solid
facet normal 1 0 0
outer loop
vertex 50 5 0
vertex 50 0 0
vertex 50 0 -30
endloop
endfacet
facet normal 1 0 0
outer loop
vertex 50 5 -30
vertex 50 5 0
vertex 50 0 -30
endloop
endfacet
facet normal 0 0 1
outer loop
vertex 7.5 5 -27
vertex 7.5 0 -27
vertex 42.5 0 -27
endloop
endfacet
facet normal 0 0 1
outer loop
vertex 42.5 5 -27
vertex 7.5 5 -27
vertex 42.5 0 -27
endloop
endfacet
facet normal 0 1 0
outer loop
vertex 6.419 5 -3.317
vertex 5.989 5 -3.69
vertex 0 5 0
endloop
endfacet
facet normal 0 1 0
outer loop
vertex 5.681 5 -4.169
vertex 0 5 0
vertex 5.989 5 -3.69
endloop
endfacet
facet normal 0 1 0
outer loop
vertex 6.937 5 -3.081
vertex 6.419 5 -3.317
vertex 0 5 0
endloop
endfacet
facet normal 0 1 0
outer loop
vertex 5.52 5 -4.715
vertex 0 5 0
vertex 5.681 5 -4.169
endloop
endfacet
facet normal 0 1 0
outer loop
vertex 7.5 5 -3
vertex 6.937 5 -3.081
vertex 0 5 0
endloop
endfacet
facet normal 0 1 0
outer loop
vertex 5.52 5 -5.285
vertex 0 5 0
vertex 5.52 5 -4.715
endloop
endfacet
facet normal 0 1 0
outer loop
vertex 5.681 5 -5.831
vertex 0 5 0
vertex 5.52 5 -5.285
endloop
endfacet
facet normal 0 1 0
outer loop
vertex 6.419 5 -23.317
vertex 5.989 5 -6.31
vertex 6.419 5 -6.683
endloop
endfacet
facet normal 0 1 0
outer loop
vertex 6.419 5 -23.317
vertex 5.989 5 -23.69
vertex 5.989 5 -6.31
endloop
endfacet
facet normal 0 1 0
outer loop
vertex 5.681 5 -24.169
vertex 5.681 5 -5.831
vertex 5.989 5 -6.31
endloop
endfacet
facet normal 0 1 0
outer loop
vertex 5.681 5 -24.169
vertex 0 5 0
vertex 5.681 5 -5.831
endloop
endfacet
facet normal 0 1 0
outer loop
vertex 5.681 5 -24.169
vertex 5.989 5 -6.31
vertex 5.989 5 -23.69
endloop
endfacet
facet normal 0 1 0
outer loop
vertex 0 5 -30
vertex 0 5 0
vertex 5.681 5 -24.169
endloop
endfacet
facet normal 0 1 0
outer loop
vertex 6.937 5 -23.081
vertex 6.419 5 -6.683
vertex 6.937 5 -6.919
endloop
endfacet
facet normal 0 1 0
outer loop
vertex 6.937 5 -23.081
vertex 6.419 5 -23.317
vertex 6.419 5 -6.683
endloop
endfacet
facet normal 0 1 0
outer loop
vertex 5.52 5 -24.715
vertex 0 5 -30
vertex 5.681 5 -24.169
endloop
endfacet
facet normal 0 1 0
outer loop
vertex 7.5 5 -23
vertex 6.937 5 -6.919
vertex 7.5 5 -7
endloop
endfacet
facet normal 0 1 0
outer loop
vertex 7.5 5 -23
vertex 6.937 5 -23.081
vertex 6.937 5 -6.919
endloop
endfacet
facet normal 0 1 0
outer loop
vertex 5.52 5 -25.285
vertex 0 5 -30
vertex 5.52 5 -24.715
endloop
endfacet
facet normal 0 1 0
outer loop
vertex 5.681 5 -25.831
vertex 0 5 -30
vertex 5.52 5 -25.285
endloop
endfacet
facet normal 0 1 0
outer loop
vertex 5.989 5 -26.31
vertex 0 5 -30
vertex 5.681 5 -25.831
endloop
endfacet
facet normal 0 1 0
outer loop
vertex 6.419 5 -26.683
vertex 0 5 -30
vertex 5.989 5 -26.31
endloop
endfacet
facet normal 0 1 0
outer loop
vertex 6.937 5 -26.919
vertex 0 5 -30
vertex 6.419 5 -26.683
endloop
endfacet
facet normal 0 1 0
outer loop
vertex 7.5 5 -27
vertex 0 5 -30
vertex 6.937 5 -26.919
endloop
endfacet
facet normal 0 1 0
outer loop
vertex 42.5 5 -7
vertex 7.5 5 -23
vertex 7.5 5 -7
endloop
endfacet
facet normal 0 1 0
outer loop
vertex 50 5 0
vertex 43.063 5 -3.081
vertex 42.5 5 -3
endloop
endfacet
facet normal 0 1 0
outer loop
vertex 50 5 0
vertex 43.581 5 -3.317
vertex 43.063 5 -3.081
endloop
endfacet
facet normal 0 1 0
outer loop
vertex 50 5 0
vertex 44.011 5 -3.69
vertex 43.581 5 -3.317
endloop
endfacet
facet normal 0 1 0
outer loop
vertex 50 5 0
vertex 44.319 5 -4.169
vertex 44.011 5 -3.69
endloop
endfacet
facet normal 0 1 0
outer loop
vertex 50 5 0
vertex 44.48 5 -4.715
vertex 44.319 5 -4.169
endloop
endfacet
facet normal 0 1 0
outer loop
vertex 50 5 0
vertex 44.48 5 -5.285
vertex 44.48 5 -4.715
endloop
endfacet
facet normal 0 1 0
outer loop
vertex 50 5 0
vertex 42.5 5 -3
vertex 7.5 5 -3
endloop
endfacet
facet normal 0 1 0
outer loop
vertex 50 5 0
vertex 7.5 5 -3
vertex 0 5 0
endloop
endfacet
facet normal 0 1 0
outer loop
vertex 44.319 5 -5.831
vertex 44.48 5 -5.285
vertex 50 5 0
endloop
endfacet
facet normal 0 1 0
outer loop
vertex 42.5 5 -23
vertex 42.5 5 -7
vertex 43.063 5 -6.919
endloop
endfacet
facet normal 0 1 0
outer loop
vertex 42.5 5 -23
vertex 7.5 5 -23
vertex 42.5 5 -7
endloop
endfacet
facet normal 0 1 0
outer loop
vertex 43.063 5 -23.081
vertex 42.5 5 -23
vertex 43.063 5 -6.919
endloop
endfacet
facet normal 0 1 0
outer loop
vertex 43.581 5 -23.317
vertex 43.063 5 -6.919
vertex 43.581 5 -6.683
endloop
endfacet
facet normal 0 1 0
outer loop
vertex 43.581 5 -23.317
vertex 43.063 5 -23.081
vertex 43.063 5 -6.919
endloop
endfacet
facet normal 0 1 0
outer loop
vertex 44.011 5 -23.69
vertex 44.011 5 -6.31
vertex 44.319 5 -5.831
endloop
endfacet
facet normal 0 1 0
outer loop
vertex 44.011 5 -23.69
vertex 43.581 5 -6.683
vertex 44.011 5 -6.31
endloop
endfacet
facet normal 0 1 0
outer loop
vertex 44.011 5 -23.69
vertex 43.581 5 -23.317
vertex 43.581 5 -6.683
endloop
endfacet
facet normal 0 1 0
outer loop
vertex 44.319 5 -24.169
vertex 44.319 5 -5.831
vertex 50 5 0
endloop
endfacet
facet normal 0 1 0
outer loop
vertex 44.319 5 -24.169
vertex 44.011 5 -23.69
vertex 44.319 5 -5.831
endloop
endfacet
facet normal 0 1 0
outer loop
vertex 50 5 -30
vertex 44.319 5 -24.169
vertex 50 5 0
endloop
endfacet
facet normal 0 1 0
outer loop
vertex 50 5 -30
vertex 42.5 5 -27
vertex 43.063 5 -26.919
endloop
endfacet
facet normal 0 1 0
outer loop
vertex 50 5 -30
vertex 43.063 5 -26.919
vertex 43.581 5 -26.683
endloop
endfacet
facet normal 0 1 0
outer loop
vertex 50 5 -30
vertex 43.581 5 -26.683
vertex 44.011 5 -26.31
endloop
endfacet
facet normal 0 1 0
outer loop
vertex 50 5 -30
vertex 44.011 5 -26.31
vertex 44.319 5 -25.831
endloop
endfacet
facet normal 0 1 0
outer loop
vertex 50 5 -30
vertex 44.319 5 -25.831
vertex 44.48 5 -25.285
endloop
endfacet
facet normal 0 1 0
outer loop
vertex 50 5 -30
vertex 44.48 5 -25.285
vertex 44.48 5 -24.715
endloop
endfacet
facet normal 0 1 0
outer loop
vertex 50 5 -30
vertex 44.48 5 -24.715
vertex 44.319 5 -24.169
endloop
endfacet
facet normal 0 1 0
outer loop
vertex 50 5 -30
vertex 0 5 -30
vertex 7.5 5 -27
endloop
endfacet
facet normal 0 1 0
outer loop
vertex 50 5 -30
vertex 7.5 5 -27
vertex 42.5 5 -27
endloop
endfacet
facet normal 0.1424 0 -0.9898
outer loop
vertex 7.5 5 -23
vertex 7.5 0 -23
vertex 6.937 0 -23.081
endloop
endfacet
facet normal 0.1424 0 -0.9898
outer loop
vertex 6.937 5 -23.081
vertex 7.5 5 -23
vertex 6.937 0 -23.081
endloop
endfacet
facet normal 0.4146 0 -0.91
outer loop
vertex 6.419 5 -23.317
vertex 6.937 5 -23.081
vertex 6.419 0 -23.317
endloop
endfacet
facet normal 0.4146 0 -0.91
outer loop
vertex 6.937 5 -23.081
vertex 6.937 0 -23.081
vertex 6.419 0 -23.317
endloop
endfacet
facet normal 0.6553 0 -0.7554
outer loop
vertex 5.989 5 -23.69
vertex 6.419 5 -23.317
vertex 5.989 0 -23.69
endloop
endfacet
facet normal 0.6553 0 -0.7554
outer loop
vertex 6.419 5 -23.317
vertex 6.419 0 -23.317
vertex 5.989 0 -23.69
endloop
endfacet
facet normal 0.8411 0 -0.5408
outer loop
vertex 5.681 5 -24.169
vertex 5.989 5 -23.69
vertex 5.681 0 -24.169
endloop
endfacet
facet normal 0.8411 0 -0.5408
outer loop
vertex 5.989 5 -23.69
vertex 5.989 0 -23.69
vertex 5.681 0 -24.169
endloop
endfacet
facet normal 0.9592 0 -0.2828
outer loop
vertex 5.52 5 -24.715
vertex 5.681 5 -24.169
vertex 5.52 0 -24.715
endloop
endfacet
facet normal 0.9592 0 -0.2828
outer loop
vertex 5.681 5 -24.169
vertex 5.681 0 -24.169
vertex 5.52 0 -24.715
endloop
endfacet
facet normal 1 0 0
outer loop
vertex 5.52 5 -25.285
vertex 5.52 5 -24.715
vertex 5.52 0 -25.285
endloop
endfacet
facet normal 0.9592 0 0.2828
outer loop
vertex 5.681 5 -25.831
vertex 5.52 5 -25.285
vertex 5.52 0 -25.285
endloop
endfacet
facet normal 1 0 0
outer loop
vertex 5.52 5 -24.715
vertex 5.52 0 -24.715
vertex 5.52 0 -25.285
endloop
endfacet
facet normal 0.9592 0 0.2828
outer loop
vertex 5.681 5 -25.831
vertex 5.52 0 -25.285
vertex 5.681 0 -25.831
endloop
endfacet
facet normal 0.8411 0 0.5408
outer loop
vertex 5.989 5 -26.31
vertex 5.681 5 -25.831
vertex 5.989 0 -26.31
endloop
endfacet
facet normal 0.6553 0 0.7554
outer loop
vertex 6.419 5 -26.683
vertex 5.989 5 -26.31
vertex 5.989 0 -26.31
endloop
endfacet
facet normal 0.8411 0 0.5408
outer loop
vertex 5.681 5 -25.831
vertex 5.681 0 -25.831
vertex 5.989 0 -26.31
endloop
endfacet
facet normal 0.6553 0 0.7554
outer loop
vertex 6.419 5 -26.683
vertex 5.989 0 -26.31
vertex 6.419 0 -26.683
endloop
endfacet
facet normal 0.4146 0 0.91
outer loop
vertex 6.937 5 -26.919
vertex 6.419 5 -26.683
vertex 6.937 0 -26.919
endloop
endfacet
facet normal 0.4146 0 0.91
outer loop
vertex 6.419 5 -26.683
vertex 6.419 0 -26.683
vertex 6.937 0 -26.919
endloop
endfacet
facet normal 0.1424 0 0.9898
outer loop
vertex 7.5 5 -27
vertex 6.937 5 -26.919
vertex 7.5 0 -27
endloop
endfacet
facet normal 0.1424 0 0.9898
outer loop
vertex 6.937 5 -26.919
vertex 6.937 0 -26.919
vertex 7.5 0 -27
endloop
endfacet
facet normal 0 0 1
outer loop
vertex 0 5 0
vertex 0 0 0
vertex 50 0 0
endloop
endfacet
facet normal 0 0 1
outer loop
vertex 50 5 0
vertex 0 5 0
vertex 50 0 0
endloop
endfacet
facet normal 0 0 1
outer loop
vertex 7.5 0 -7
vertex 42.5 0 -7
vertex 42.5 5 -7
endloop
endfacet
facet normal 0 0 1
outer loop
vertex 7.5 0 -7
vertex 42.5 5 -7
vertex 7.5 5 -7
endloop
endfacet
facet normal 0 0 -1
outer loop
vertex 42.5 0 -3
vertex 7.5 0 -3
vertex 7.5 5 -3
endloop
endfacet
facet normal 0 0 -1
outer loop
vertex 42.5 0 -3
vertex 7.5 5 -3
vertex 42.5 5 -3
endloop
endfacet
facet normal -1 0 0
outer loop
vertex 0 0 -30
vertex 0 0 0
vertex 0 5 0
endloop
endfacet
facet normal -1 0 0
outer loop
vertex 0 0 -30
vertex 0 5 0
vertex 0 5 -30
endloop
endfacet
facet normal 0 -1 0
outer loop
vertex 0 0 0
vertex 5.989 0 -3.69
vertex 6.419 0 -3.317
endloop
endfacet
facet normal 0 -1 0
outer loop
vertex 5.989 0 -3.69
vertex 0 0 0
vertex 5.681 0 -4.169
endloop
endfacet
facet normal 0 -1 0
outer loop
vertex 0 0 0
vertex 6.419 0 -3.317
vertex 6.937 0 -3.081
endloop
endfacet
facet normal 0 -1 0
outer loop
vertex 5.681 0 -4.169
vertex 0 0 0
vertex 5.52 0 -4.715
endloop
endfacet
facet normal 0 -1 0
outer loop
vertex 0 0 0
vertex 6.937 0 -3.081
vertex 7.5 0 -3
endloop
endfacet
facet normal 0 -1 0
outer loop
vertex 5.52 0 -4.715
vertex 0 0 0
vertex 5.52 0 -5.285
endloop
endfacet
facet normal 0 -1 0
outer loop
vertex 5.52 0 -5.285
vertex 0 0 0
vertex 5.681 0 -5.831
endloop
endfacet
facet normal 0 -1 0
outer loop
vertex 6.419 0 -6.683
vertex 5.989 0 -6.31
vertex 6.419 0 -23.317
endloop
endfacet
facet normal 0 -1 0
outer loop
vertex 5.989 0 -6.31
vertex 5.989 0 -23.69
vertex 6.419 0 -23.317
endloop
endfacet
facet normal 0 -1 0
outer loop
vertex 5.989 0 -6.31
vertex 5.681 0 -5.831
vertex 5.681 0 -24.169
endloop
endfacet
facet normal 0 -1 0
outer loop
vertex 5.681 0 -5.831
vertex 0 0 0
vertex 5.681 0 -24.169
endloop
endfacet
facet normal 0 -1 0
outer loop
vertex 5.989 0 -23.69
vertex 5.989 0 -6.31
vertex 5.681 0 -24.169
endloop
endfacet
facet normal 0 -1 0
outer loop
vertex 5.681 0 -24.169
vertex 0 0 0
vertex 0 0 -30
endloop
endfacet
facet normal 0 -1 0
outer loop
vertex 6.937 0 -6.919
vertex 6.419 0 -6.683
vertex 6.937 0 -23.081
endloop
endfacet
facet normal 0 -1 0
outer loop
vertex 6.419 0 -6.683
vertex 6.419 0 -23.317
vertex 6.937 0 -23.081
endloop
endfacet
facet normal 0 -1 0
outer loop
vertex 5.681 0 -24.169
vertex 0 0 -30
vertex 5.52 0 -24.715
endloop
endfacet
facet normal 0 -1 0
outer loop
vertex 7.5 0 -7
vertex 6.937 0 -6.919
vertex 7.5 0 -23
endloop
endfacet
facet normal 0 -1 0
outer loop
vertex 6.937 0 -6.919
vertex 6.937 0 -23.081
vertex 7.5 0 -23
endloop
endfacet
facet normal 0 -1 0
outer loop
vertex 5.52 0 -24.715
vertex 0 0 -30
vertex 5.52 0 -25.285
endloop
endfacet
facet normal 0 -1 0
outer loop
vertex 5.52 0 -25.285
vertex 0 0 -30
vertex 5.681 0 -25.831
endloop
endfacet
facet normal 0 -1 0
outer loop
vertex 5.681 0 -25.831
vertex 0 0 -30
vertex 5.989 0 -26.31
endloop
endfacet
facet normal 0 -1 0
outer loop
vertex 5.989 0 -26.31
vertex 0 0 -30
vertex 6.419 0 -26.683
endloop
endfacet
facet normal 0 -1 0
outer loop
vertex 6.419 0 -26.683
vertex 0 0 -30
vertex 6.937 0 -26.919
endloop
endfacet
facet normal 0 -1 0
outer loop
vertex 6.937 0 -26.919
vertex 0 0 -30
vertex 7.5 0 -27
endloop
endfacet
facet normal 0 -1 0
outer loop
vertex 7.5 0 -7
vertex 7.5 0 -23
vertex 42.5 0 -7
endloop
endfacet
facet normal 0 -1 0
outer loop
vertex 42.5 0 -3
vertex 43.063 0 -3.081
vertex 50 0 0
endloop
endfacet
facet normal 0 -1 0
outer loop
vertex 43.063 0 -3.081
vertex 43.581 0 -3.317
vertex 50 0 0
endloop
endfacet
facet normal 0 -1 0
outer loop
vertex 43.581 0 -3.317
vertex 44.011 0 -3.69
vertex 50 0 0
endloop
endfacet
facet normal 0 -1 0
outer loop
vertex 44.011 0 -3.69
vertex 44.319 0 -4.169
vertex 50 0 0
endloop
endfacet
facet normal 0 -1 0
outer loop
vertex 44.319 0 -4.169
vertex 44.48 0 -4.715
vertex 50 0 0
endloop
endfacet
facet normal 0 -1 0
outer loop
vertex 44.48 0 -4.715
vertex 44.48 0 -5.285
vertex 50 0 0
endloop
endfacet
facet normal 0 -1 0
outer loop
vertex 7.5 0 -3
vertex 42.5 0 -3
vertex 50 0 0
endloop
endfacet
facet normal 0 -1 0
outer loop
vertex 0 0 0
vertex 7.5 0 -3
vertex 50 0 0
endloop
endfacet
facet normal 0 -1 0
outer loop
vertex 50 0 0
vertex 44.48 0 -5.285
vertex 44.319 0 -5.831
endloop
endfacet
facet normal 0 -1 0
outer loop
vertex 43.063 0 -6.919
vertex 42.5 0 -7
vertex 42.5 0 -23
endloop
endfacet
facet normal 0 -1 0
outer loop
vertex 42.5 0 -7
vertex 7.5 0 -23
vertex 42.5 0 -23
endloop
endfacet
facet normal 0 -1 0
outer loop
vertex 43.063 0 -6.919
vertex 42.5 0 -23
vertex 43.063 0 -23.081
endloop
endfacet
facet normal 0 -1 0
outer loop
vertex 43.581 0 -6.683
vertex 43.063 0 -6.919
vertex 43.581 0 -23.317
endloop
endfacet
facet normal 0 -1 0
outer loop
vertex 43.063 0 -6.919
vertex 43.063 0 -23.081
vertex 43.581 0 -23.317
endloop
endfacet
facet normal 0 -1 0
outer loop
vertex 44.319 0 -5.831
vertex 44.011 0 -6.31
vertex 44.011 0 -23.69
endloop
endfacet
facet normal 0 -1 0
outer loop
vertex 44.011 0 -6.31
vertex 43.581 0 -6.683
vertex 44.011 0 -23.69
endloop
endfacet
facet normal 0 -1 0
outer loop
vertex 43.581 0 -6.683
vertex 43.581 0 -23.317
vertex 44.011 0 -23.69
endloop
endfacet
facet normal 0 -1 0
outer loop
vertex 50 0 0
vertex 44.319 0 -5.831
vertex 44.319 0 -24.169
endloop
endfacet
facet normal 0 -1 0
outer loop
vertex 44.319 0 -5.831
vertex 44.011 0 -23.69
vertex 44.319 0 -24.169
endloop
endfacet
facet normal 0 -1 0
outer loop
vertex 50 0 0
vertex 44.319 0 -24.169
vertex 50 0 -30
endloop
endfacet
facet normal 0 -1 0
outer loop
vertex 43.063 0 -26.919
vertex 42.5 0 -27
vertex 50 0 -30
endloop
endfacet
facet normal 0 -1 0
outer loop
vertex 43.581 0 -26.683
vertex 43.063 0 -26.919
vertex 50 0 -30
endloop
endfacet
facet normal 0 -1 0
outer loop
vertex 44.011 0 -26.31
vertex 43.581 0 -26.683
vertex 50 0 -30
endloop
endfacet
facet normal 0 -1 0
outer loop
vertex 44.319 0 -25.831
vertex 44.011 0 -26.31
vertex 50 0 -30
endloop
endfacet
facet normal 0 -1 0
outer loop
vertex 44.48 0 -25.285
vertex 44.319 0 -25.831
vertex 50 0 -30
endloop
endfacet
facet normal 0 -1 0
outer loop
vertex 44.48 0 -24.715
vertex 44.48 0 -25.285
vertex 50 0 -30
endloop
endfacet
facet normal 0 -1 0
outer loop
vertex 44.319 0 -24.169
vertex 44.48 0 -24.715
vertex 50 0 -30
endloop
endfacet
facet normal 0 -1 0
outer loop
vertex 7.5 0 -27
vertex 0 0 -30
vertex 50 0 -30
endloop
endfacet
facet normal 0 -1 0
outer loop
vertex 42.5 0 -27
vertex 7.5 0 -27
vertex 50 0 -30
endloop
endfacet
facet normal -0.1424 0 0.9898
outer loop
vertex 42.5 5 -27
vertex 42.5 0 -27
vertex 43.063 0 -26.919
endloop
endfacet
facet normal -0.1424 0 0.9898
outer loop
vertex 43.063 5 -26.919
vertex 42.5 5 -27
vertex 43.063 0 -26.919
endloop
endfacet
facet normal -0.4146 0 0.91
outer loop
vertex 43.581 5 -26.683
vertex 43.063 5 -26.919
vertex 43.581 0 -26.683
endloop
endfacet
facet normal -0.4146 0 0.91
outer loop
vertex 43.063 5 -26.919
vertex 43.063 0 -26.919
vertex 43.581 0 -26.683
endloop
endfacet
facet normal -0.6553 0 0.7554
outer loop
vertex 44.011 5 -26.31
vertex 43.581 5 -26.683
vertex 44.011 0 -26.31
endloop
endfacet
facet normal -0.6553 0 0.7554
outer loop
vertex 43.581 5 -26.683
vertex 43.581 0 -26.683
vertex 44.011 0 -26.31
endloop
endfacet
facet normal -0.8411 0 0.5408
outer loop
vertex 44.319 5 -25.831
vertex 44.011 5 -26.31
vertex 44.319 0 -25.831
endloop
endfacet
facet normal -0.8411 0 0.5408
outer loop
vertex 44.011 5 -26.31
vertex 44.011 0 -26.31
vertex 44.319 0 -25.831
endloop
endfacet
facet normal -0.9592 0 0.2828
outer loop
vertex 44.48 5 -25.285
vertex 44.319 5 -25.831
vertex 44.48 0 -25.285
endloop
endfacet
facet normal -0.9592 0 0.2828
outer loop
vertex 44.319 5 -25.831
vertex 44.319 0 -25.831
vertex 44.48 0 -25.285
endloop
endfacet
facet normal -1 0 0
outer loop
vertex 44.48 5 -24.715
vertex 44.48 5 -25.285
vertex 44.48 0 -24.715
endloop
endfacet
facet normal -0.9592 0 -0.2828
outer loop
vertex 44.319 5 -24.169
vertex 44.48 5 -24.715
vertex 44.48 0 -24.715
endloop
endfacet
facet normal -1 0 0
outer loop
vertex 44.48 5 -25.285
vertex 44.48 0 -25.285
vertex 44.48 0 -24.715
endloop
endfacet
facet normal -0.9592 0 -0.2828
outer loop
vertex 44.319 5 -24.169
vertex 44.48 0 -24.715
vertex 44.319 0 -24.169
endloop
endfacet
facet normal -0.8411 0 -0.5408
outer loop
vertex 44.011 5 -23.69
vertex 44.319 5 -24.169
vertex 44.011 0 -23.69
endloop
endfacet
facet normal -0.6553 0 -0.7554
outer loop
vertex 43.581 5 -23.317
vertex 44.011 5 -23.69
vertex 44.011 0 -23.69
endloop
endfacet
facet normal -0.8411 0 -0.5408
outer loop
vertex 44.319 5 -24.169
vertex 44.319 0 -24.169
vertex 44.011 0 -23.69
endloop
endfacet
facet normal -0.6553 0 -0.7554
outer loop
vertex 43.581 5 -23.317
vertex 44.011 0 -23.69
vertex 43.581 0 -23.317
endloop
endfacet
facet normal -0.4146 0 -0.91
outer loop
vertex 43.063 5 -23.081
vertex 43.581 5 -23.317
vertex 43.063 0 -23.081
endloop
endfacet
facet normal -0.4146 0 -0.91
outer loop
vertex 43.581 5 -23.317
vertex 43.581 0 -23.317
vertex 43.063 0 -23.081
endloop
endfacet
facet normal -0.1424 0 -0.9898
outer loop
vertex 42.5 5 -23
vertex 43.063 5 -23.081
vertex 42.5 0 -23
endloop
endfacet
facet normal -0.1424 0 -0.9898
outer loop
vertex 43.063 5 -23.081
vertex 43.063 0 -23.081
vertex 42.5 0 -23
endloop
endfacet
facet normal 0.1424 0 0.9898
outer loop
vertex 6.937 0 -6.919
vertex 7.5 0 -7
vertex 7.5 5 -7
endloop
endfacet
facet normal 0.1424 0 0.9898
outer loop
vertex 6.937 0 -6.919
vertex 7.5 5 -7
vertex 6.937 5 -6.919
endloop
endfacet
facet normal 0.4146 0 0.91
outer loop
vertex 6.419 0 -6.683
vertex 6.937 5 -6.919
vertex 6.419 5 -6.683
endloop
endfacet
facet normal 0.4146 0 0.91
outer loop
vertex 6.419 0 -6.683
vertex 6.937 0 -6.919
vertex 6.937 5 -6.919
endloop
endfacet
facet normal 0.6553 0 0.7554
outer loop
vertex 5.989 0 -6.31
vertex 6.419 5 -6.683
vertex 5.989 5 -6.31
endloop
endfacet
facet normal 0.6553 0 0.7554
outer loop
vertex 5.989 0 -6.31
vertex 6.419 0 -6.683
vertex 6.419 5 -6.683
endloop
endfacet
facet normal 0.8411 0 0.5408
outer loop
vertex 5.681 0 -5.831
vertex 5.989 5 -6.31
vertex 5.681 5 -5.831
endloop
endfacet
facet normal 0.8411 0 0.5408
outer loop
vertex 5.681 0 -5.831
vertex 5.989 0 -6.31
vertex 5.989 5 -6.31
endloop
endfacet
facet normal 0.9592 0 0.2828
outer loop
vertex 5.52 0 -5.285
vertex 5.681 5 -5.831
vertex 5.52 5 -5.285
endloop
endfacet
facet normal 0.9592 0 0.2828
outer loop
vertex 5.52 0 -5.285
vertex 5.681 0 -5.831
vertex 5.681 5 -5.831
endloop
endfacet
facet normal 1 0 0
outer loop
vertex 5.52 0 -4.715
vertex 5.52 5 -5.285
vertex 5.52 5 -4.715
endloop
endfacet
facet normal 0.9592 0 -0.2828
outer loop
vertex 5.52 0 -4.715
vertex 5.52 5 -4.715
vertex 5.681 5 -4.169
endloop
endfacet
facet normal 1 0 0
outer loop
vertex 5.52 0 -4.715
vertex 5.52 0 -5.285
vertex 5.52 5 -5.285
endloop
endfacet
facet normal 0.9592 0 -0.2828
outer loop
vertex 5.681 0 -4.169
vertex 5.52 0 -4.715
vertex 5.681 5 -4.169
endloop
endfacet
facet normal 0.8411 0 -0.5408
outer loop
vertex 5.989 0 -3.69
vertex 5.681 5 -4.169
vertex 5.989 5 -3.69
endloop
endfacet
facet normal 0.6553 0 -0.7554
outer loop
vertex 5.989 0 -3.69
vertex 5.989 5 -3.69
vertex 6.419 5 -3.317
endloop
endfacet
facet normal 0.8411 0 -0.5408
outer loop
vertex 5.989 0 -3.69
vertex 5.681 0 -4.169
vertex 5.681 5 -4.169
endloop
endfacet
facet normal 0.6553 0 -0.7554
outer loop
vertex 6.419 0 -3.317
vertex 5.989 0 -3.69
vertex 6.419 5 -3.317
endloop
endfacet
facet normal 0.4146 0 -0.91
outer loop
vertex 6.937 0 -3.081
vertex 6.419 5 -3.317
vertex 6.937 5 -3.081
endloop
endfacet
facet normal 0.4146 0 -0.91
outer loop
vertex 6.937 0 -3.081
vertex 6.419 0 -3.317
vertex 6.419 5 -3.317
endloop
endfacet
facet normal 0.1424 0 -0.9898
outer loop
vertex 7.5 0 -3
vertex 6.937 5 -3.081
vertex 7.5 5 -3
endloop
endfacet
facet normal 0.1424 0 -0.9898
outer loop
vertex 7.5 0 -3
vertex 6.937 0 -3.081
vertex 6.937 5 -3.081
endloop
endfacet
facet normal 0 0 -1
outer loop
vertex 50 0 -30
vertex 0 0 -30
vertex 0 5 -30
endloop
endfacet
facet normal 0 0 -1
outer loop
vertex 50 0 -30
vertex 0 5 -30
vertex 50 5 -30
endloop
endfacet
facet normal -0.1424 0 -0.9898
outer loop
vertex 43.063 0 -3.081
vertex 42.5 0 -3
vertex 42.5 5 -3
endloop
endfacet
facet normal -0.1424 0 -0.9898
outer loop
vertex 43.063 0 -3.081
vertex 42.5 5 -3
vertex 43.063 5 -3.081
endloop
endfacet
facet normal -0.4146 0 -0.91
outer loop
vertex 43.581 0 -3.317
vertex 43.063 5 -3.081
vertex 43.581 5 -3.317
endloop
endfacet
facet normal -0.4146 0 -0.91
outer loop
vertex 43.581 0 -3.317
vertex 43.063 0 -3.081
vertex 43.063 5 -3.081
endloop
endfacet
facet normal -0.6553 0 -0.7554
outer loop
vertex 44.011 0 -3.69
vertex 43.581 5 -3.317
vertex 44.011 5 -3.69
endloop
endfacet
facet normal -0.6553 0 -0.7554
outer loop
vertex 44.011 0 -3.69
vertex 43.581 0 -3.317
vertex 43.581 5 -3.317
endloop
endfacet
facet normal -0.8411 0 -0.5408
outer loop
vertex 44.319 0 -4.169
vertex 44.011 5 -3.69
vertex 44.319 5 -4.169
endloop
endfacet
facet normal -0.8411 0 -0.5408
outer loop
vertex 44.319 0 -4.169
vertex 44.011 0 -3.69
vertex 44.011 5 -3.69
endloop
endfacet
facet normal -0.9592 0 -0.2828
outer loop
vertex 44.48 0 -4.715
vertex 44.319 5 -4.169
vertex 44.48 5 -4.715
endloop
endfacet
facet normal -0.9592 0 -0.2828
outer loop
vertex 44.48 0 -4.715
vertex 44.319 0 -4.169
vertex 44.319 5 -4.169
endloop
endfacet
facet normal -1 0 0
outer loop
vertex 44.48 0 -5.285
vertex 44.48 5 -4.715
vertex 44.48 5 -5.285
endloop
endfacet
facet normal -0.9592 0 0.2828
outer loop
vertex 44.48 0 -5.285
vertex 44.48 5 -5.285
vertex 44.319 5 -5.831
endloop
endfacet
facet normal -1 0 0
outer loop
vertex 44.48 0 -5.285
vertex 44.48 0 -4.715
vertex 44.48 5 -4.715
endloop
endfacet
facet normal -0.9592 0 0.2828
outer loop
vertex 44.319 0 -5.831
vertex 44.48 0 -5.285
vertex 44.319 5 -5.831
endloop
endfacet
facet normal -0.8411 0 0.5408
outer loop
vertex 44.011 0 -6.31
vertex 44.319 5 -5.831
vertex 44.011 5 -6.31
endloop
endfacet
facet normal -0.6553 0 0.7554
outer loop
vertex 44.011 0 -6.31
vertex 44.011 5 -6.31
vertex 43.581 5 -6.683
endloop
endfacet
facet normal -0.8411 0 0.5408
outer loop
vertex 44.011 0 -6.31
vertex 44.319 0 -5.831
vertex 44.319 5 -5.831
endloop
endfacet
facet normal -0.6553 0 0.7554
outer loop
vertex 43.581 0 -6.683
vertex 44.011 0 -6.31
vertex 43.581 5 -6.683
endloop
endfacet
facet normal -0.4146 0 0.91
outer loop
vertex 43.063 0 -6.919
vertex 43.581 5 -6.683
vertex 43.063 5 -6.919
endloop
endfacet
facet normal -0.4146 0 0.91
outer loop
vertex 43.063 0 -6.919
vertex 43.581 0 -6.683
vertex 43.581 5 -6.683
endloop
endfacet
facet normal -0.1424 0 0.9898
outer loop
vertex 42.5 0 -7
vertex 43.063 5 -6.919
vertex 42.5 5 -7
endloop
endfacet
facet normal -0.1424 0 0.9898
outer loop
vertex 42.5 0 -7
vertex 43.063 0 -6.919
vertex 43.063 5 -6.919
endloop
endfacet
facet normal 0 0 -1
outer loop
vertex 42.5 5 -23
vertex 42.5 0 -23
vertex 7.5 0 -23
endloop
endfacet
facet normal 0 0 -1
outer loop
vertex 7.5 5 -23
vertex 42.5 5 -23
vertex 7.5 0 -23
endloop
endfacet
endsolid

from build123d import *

# Parameters (mm, degrees)
SKETCH1_W           = 50
SKETCH1_H           = 30
BOSS_EXTRUDE1_DEPTH = 5


with BuildPart() as part:
    # Sketch1 → Boss-Extrude1 (new body)
    with BuildSketch(Plane(origin=(0, 0, 0), x_dir=(1, 0, 0), z_dir=(0, 1, 0))):
        with Locations((25, 15)):
            Rectangle(SKETCH1_W, SKETCH1_H)
        with BuildLine():
            Line((7.5, 27), (42.5, 27))
            ThreePointArc((42.5, 27), (44.5, 25), (42.5, 23))
            Line((42.5, 23), (7.5, 23))
            ThreePointArc((7.5, 23), (5.5, 25), (7.5, 27))
        make_face(mode=Mode.SUBTRACT)
        with BuildLine():
            Line((42.5, 7), (7.5, 7))
            ThreePointArc((7.5, 7), (5.5, 5), (7.5, 3))
            Line((7.5, 3), (42.5, 3))
            ThreePointArc((42.5, 3), (44.5, 5), (42.5, 7))
        make_face(mode=Mode.SUBTRACT)
    extrude(amount=BOSS_EXTRUDE1_DEPTH)


solid = part.part
